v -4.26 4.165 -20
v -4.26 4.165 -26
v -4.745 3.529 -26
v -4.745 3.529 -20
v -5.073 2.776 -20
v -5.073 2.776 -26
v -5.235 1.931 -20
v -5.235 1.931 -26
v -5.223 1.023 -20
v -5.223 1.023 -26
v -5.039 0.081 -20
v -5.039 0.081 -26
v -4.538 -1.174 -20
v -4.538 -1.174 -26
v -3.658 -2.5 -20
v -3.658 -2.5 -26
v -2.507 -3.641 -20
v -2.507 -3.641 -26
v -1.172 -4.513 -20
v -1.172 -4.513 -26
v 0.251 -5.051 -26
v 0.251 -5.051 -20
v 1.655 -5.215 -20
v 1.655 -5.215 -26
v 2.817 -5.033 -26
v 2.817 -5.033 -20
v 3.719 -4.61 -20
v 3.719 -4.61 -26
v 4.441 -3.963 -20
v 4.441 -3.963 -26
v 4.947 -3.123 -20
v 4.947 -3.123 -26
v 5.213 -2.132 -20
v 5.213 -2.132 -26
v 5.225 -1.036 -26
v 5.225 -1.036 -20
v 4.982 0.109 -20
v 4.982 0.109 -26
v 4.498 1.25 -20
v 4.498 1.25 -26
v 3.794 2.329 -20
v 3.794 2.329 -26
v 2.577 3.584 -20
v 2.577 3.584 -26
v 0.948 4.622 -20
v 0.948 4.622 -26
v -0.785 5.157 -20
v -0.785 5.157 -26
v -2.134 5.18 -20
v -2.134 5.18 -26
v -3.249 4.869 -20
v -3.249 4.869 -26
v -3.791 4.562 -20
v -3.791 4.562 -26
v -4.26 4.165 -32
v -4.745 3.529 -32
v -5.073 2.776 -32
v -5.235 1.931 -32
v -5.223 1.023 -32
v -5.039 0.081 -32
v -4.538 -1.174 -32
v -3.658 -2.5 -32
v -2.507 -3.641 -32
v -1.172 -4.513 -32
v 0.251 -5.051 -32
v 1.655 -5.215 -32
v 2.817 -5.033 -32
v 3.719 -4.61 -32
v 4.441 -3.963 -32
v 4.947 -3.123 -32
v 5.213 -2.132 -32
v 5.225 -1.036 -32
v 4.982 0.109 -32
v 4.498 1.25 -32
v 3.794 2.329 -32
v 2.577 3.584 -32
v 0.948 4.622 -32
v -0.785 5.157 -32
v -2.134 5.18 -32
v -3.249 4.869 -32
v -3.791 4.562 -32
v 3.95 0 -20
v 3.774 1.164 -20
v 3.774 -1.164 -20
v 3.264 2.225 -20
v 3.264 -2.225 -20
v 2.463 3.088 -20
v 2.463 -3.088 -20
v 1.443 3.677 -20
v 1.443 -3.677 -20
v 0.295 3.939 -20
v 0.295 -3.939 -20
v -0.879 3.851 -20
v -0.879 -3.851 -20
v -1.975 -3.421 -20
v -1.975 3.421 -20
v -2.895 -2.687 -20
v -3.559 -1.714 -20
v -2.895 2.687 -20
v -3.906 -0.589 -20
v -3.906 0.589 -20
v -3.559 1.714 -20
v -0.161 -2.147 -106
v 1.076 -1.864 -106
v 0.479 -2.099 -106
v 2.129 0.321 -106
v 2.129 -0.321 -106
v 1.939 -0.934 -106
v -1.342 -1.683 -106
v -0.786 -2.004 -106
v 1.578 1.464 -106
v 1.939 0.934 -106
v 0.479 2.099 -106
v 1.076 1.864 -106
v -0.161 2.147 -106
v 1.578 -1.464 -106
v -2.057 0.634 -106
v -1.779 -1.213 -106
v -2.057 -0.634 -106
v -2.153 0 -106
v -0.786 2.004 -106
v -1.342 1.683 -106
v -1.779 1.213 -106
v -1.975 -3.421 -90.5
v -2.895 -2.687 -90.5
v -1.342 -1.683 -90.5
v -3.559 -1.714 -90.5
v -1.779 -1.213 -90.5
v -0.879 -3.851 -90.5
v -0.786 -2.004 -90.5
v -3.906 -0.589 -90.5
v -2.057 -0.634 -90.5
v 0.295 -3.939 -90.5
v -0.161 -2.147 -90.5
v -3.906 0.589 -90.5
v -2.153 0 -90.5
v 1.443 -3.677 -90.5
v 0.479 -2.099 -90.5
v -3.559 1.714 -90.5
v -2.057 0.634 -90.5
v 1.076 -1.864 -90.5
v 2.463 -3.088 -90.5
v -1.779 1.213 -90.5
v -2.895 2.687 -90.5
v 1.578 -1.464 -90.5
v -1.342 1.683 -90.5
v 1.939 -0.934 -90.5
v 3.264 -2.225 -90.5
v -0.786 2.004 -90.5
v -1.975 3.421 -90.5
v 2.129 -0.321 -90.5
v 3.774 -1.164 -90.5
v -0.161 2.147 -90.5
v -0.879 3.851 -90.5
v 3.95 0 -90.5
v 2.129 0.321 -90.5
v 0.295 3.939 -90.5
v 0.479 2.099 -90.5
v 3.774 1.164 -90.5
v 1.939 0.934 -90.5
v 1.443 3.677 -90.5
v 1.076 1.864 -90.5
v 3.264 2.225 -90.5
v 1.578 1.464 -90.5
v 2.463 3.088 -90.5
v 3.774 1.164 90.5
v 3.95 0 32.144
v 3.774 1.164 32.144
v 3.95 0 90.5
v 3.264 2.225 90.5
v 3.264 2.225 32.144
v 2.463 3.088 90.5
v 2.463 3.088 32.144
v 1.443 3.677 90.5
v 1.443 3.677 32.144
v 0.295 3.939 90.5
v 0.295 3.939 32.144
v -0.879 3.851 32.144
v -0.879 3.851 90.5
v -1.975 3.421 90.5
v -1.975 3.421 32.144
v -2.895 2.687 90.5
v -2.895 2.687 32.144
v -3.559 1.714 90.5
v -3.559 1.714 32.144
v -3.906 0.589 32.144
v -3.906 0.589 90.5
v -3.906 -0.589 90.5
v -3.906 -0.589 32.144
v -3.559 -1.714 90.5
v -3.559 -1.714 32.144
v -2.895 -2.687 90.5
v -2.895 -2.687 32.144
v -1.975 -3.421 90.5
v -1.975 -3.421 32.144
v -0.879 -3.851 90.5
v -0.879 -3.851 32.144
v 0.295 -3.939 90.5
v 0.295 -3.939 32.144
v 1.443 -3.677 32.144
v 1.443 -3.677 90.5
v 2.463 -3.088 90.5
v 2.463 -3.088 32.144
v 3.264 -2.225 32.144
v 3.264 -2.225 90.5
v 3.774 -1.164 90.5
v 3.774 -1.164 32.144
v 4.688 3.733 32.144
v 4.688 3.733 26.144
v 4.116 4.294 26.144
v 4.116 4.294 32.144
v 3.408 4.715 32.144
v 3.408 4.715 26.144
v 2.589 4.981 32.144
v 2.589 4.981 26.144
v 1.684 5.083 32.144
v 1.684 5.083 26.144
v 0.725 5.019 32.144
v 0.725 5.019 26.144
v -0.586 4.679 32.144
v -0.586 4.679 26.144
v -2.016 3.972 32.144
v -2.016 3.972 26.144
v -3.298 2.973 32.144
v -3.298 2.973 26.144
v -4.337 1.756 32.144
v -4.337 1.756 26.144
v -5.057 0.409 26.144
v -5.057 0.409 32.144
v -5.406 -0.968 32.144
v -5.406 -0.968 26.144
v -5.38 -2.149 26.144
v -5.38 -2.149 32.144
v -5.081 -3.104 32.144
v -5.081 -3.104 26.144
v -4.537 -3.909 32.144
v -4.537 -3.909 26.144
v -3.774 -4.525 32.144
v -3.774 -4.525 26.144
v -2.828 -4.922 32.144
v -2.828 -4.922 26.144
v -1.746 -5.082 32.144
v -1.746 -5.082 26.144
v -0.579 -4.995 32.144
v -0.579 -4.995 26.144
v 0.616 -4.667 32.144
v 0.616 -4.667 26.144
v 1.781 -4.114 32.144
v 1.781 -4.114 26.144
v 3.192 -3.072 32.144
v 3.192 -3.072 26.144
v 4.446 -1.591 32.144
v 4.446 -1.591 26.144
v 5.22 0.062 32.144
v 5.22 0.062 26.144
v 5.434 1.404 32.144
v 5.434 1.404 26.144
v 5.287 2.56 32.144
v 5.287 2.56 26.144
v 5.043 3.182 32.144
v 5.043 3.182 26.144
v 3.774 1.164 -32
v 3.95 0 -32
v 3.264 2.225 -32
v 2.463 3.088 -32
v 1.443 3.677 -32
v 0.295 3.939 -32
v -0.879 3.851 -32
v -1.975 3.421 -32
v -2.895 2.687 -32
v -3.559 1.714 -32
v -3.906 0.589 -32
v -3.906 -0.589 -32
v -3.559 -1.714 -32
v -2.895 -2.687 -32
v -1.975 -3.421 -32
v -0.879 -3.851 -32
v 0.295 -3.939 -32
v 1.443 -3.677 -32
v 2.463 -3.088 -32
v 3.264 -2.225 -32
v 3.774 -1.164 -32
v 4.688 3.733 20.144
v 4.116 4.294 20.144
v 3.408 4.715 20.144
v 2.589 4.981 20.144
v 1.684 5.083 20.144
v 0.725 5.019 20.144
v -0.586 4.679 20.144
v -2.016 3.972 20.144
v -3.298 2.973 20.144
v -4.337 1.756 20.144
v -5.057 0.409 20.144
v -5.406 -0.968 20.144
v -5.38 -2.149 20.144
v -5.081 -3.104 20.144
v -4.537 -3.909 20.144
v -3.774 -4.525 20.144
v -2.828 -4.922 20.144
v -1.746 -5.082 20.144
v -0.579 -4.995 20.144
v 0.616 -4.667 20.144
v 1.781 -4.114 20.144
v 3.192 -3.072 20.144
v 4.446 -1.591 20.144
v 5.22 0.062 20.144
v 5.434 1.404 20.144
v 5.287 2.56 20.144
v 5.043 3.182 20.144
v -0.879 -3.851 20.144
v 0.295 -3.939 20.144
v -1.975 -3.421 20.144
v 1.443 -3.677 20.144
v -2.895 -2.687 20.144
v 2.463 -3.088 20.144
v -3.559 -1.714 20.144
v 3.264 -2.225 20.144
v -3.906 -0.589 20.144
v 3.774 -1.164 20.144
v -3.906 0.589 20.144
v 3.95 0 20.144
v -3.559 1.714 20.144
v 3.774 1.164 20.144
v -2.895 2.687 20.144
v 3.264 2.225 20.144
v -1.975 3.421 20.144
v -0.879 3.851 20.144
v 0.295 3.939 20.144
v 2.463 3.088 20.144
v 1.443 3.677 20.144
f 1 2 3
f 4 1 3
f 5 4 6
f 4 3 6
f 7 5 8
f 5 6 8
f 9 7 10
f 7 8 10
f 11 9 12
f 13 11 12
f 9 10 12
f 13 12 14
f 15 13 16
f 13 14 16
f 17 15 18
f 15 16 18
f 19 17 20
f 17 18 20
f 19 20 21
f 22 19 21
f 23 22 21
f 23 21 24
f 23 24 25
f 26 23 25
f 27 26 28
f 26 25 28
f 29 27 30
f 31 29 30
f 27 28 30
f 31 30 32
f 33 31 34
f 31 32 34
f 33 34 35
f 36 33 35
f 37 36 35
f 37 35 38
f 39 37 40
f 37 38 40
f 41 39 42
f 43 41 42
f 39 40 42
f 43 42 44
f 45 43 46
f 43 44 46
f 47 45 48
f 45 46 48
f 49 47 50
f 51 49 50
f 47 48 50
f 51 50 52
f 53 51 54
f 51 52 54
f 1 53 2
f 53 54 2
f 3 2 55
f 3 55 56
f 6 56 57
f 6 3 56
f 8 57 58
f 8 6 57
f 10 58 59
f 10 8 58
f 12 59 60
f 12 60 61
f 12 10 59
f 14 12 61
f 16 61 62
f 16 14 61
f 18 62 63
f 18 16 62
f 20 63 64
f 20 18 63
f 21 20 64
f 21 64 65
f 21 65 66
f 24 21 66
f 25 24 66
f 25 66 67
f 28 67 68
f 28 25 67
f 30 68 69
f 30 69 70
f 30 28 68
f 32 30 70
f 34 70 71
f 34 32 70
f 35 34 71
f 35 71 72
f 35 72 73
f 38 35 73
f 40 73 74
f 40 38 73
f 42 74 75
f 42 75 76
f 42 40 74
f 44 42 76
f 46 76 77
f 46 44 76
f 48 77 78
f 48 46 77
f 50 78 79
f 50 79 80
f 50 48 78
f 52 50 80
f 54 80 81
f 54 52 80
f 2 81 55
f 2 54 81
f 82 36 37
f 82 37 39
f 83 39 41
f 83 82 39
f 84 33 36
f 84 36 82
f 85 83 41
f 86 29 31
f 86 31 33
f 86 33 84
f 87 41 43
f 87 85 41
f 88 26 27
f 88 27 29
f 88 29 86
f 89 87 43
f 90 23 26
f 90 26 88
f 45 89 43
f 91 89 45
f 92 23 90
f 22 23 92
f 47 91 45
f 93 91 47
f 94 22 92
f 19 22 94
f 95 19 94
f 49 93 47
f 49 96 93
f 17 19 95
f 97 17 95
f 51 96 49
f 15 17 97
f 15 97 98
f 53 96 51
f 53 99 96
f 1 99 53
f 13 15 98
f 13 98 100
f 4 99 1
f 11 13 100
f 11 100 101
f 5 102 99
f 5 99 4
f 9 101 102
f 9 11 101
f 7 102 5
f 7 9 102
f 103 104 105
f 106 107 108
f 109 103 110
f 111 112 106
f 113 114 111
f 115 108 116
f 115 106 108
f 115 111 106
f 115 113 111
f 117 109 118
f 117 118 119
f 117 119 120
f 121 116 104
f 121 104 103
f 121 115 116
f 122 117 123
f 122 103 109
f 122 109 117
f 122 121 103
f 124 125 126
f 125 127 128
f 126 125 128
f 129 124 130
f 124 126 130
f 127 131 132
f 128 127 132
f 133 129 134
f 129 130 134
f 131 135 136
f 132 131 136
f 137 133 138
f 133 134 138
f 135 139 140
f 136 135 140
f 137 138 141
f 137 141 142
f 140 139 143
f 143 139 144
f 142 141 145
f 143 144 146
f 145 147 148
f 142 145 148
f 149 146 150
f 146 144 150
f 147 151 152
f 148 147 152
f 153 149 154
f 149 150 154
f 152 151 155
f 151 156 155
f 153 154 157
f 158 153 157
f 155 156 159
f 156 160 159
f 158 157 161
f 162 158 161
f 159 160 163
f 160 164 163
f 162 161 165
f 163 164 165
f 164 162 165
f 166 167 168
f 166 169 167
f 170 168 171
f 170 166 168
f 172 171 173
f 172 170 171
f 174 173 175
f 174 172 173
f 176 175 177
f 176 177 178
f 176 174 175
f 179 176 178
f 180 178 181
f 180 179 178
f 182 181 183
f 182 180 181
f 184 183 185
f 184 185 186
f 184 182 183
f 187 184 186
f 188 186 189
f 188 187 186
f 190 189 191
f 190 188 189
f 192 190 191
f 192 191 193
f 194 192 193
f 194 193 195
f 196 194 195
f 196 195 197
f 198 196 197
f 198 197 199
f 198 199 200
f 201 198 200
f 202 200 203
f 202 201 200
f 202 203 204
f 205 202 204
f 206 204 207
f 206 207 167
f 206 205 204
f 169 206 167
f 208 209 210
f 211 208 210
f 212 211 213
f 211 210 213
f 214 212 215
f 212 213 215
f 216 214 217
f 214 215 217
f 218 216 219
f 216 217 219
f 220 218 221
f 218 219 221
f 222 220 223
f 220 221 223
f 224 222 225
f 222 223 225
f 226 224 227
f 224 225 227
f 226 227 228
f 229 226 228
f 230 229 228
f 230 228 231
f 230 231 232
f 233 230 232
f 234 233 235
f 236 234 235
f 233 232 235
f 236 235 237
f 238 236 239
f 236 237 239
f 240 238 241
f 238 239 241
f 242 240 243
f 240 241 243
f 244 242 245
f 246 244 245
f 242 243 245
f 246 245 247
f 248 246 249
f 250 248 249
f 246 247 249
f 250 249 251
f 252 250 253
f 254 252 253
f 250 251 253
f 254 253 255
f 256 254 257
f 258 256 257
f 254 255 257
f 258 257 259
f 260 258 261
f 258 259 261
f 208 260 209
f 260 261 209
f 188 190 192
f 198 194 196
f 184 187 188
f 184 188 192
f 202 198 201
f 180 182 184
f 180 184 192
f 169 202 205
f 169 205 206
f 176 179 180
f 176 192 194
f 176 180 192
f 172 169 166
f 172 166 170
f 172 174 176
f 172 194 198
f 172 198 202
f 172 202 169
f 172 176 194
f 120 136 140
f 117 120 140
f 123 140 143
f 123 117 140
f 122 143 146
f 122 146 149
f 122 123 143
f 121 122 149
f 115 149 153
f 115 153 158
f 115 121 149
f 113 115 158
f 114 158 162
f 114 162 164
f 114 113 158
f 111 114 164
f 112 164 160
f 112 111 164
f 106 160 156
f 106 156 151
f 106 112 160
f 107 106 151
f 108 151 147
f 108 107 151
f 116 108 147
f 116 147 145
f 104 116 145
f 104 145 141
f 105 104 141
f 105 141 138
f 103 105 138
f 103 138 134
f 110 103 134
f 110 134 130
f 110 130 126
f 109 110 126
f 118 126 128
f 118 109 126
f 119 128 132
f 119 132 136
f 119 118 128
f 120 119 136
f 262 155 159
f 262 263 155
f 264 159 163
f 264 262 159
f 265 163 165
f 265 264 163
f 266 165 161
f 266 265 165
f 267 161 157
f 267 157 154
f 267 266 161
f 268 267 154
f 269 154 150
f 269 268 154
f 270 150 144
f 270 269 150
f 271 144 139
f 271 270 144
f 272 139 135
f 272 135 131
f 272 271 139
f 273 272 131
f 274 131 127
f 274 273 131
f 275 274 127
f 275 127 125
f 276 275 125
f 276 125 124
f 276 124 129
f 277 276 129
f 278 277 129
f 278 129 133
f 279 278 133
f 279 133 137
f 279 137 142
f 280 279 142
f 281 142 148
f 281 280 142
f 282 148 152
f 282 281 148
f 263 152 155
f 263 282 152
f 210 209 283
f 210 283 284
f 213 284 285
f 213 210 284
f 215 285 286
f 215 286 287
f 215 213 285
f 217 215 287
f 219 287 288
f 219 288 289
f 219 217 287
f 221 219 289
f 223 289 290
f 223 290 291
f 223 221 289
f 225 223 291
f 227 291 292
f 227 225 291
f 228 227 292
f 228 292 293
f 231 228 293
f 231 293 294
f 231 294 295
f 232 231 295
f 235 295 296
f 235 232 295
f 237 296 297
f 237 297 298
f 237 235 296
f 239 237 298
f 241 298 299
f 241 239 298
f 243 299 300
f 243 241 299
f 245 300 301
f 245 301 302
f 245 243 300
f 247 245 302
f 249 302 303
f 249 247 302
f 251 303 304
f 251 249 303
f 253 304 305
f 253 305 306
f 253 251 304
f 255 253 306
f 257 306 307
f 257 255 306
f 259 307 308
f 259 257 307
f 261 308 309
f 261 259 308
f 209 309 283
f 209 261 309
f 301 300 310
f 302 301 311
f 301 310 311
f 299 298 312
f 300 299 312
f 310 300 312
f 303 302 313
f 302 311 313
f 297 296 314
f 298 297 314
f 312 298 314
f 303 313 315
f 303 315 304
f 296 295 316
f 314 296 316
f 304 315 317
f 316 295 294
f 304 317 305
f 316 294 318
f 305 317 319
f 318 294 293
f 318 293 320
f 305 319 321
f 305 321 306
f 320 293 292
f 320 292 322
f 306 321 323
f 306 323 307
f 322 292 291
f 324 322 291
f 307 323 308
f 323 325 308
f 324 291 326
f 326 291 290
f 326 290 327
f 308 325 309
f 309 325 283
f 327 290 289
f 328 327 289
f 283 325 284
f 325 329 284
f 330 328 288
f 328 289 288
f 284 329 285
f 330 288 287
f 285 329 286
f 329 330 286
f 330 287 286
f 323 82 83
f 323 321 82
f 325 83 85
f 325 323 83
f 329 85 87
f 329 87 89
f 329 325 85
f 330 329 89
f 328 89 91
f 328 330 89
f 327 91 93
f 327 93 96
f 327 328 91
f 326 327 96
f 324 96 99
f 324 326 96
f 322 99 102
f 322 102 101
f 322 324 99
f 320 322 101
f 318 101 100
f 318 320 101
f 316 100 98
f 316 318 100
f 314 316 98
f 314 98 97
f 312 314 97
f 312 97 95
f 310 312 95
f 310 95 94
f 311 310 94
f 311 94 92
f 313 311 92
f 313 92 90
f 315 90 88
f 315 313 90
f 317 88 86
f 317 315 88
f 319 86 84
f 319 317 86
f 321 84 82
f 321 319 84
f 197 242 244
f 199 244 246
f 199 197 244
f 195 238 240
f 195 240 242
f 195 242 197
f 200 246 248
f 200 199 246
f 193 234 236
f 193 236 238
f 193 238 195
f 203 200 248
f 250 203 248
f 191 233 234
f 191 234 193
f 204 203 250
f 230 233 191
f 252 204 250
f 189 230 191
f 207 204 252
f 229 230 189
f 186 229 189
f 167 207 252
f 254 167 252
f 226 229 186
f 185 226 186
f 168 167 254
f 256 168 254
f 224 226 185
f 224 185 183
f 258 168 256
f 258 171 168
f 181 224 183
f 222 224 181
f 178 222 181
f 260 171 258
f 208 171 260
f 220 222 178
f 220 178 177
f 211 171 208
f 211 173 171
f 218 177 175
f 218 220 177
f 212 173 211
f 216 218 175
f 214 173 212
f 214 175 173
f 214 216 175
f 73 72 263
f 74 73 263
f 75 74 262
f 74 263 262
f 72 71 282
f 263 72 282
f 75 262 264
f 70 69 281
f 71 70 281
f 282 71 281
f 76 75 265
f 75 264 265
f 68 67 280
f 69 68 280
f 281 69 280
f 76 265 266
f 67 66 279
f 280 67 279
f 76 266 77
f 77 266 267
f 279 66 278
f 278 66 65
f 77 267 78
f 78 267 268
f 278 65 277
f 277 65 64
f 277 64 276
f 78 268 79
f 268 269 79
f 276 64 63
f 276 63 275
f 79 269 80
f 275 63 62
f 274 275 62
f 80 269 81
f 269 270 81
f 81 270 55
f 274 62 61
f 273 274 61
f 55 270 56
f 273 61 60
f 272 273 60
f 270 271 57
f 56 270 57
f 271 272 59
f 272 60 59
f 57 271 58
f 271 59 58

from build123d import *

# Parameters (mm, degrees)
IZIM1_R                     = 3.949830294
Y_KSEKLIK_EKSTR_ZYON1_DEPTH = 90.5
IZIM2_RX                    = 5.99273517
IZIM2_RY                    = 4.41265557
Y_KSEKLIK_EKSTR_ZYON2_DEPTH = 6
IZIM3_RX                    = 5.957724317
IZIM3_RY                    = 4.391576019
Y_KSEKLIK_EKSTR_ZYON3_DEPTH = 6
IZIM5_R                     = 2.152579794
Y_KSEKLIK_EKSTR_ZYON5_DEPTH = 15.5


with BuildPart() as part:
    # Çizim1 → Yükseklik-Ekstrüzyon1 (new body, symmetric)
    with BuildSketch(Plane.XY):
        Circle(IZIM1_R)
    extrude(amount=Y_KSEKLIK_EKSTR_ZYON1_DEPTH, both=True)

    # Çizim2 → Yükseklik-Ekstrüzyon2 (add, symmetric)
    with BuildSketch(Plane.XY.offset(26.14365475)):
        with Locations(Location((0, 0), (0, 0, 38.527816434))):
            Ellipse(IZIM2_RX, IZIM2_RY)
    extrude(amount=Y_KSEKLIK_EKSTR_ZYON2_DEPTH, both=True)

    # Çizim3 → Yükseklik-Ekstrüzyon3 (add, symmetric)
    with BuildSketch(Plane.XY.offset(-26)):
        with Locations(Location((0, 0), (0, 0, 135.642302459))):
            Ellipse(IZIM3_RX, IZIM3_RY)
    extrude(amount=Y_KSEKLIK_EKSTR_ZYON3_DEPTH, both=True)

    # Çizim5 → Yükseklik-Ekstrüzyon5 (add, symmetric)
    with BuildSketch(Plane(origin=(0, 0, -90.5), x_dir=(-1, 0, 0), z_dir=(0, 0, -1))):
        Circle(IZIM5_R)
    extrude(amount=Y_KSEKLIK_EKSTR_ZYON5_DEPTH, both=True)


solid = part.part
